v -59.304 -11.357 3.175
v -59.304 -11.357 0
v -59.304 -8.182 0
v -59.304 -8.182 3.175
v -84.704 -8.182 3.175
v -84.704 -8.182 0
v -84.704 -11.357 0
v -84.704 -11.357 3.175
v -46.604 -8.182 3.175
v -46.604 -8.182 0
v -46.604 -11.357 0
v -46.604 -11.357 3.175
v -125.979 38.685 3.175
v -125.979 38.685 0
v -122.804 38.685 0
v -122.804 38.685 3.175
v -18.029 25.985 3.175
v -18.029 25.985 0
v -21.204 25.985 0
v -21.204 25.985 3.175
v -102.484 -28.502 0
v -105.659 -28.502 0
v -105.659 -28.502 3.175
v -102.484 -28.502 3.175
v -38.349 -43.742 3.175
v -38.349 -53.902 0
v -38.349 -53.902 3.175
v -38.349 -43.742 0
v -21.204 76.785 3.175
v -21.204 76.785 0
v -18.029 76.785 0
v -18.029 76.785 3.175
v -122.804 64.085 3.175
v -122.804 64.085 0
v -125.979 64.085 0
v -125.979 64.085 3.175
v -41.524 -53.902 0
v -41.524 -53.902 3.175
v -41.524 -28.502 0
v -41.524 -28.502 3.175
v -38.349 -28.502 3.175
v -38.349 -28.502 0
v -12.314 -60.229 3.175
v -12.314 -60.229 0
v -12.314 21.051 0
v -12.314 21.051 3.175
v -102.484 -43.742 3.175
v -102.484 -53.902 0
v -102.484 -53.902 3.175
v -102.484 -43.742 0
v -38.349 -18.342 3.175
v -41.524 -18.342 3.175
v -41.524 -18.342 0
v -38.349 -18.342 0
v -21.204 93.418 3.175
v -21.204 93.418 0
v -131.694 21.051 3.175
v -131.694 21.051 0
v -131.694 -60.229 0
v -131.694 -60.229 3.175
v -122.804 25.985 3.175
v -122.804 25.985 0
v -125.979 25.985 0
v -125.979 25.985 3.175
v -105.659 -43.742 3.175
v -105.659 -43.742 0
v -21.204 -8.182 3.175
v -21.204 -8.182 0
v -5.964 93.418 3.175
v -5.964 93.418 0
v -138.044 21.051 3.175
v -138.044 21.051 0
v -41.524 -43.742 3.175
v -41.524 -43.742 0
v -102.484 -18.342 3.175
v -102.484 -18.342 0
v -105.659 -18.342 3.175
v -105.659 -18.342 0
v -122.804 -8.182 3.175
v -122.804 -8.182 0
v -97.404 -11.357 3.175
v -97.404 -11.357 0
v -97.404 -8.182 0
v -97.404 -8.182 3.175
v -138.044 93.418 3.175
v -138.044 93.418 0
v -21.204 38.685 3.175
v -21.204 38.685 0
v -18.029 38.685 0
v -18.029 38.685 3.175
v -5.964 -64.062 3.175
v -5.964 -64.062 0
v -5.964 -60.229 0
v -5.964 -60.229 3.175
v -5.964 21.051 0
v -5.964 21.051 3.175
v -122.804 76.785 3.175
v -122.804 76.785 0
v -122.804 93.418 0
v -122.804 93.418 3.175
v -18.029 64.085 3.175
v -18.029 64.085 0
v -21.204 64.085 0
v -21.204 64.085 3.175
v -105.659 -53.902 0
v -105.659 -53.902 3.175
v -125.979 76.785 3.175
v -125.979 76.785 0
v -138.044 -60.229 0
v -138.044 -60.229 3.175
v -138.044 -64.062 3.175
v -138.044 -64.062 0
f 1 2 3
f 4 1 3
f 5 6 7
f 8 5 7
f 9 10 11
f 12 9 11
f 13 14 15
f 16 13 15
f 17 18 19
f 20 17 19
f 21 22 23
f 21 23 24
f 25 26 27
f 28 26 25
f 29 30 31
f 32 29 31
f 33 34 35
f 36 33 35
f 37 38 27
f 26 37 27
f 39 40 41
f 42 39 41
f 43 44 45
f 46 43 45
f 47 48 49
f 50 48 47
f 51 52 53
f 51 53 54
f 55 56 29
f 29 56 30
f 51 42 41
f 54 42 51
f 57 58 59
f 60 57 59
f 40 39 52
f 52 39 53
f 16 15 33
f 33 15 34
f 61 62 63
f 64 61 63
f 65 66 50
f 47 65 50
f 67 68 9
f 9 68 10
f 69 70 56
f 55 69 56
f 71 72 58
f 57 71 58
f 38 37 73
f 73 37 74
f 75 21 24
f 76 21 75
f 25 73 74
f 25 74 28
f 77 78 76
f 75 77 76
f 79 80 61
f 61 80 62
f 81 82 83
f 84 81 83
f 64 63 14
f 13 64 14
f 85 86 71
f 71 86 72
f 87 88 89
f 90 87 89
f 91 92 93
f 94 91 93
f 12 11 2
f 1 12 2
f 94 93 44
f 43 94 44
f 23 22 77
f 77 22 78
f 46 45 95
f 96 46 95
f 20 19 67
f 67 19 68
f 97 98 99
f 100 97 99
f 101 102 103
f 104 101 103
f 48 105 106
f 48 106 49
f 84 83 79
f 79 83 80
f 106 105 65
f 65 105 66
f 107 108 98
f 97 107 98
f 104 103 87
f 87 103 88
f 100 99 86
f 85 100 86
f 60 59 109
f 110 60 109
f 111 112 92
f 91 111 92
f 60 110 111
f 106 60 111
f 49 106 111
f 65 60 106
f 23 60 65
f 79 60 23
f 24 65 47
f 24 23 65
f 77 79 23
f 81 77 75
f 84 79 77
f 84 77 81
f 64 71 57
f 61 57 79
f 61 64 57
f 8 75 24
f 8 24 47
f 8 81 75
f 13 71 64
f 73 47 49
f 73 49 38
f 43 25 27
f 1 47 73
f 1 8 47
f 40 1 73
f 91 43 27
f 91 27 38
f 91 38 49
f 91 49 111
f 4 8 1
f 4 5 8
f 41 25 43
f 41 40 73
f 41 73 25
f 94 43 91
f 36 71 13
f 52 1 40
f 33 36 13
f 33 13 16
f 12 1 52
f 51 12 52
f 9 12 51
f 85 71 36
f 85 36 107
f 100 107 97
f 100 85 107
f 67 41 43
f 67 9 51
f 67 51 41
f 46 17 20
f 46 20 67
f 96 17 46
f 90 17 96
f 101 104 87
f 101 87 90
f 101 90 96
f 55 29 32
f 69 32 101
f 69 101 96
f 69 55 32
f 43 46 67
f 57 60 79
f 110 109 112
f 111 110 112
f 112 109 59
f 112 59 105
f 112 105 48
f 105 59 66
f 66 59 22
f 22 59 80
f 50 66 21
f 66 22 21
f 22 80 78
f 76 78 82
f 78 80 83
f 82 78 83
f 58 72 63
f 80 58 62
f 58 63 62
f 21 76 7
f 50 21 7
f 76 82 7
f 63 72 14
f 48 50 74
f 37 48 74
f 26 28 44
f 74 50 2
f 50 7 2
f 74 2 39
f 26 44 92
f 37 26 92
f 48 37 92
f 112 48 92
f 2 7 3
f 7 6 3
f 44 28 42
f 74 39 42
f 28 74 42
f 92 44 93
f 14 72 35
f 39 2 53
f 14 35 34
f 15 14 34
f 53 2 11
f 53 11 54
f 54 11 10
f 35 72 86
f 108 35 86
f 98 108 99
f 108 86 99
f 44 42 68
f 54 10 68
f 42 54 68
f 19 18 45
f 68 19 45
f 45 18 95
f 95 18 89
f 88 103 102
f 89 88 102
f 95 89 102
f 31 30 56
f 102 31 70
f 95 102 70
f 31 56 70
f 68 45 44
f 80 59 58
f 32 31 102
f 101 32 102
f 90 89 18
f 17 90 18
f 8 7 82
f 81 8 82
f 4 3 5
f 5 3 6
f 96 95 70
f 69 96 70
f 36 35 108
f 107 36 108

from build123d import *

# Parameters (mm, degrees)
F0_W     = 3.175
F0_H     = 10.16
F1_DEPTH = 3.175


with BuildPart() as f1:
    # F0 (on Top) → F1 (new body)
    with BuildSketch(Plane.XY):
        Polygon((-138.043921, -60.22932), (-138.043921, -64.061883), (-72.003921, -64.061883), (-72.003921, -8.181883), (-77.367083, -8.181883), (-84.703921, -8.181883), (-84.703921, -11.356883), (-97.403921, -11.356883), (-97.403921, -8.181883), (-122.803921, -8.181883), (-122.803921, 25.984842), (-125.978921, 25.984842), (-125.978921, 38.684842), (-122.803921, 38.684842), (-122.803921, 64.084842), (-125.978921, 64.084842), (-125.978921, 76.784842), (-122.803921, 76.784842), (-122.803921, 93.418117), (-138.043921, 93.418117), (-138.043921, 21.05068), (-131.693921, 21.05068), (-131.693921, -60.22932), align=None)
        with Locations((-104.071421, -48.821883)):
            Rectangle(F0_W, F0_H, mode=Mode.SUBTRACT)
        with Locations((-104.071421, -23.421883)):
            Rectangle(F0_W, F0_H, mode=Mode.SUBTRACT)
        Polygon((-72.003921, -8.181883), (-72.003921, -64.061883), (-5.963921, -64.061883), (-5.963921, -60.22932), (-12.313921, -60.22932), (-12.313921, 21.05068), (-5.963921, 21.05068), (-5.963921, 93.418125), (-21.203921, 93.418125), (-21.203921, 76.784842), (-18.028921, 76.784842), (-18.028921, 64.084842), (-21.203921, 64.084842), (-21.203921, 38.684842), (-18.028921, 38.684842), (-18.028921, 25.984842), (-21.203921, 25.984842), (-21.203921, -8.181883), (-26.567083, -8.181883), (-46.603921, -8.181883), (-46.603921, -11.356883), (-59.303921, -11.356883), (-59.303921, -8.181883), align=None)
        with Locations((-39.936421, -48.821883)):
            Rectangle(F0_W, F0_H, mode=Mode.SUBTRACT)
        with Locations((-39.936421, -23.421883)):
            Rectangle(F0_W, F0_H, mode=Mode.SUBTRACT)
    extrude(amount=F1_DEPTH)


solid = f1.part
